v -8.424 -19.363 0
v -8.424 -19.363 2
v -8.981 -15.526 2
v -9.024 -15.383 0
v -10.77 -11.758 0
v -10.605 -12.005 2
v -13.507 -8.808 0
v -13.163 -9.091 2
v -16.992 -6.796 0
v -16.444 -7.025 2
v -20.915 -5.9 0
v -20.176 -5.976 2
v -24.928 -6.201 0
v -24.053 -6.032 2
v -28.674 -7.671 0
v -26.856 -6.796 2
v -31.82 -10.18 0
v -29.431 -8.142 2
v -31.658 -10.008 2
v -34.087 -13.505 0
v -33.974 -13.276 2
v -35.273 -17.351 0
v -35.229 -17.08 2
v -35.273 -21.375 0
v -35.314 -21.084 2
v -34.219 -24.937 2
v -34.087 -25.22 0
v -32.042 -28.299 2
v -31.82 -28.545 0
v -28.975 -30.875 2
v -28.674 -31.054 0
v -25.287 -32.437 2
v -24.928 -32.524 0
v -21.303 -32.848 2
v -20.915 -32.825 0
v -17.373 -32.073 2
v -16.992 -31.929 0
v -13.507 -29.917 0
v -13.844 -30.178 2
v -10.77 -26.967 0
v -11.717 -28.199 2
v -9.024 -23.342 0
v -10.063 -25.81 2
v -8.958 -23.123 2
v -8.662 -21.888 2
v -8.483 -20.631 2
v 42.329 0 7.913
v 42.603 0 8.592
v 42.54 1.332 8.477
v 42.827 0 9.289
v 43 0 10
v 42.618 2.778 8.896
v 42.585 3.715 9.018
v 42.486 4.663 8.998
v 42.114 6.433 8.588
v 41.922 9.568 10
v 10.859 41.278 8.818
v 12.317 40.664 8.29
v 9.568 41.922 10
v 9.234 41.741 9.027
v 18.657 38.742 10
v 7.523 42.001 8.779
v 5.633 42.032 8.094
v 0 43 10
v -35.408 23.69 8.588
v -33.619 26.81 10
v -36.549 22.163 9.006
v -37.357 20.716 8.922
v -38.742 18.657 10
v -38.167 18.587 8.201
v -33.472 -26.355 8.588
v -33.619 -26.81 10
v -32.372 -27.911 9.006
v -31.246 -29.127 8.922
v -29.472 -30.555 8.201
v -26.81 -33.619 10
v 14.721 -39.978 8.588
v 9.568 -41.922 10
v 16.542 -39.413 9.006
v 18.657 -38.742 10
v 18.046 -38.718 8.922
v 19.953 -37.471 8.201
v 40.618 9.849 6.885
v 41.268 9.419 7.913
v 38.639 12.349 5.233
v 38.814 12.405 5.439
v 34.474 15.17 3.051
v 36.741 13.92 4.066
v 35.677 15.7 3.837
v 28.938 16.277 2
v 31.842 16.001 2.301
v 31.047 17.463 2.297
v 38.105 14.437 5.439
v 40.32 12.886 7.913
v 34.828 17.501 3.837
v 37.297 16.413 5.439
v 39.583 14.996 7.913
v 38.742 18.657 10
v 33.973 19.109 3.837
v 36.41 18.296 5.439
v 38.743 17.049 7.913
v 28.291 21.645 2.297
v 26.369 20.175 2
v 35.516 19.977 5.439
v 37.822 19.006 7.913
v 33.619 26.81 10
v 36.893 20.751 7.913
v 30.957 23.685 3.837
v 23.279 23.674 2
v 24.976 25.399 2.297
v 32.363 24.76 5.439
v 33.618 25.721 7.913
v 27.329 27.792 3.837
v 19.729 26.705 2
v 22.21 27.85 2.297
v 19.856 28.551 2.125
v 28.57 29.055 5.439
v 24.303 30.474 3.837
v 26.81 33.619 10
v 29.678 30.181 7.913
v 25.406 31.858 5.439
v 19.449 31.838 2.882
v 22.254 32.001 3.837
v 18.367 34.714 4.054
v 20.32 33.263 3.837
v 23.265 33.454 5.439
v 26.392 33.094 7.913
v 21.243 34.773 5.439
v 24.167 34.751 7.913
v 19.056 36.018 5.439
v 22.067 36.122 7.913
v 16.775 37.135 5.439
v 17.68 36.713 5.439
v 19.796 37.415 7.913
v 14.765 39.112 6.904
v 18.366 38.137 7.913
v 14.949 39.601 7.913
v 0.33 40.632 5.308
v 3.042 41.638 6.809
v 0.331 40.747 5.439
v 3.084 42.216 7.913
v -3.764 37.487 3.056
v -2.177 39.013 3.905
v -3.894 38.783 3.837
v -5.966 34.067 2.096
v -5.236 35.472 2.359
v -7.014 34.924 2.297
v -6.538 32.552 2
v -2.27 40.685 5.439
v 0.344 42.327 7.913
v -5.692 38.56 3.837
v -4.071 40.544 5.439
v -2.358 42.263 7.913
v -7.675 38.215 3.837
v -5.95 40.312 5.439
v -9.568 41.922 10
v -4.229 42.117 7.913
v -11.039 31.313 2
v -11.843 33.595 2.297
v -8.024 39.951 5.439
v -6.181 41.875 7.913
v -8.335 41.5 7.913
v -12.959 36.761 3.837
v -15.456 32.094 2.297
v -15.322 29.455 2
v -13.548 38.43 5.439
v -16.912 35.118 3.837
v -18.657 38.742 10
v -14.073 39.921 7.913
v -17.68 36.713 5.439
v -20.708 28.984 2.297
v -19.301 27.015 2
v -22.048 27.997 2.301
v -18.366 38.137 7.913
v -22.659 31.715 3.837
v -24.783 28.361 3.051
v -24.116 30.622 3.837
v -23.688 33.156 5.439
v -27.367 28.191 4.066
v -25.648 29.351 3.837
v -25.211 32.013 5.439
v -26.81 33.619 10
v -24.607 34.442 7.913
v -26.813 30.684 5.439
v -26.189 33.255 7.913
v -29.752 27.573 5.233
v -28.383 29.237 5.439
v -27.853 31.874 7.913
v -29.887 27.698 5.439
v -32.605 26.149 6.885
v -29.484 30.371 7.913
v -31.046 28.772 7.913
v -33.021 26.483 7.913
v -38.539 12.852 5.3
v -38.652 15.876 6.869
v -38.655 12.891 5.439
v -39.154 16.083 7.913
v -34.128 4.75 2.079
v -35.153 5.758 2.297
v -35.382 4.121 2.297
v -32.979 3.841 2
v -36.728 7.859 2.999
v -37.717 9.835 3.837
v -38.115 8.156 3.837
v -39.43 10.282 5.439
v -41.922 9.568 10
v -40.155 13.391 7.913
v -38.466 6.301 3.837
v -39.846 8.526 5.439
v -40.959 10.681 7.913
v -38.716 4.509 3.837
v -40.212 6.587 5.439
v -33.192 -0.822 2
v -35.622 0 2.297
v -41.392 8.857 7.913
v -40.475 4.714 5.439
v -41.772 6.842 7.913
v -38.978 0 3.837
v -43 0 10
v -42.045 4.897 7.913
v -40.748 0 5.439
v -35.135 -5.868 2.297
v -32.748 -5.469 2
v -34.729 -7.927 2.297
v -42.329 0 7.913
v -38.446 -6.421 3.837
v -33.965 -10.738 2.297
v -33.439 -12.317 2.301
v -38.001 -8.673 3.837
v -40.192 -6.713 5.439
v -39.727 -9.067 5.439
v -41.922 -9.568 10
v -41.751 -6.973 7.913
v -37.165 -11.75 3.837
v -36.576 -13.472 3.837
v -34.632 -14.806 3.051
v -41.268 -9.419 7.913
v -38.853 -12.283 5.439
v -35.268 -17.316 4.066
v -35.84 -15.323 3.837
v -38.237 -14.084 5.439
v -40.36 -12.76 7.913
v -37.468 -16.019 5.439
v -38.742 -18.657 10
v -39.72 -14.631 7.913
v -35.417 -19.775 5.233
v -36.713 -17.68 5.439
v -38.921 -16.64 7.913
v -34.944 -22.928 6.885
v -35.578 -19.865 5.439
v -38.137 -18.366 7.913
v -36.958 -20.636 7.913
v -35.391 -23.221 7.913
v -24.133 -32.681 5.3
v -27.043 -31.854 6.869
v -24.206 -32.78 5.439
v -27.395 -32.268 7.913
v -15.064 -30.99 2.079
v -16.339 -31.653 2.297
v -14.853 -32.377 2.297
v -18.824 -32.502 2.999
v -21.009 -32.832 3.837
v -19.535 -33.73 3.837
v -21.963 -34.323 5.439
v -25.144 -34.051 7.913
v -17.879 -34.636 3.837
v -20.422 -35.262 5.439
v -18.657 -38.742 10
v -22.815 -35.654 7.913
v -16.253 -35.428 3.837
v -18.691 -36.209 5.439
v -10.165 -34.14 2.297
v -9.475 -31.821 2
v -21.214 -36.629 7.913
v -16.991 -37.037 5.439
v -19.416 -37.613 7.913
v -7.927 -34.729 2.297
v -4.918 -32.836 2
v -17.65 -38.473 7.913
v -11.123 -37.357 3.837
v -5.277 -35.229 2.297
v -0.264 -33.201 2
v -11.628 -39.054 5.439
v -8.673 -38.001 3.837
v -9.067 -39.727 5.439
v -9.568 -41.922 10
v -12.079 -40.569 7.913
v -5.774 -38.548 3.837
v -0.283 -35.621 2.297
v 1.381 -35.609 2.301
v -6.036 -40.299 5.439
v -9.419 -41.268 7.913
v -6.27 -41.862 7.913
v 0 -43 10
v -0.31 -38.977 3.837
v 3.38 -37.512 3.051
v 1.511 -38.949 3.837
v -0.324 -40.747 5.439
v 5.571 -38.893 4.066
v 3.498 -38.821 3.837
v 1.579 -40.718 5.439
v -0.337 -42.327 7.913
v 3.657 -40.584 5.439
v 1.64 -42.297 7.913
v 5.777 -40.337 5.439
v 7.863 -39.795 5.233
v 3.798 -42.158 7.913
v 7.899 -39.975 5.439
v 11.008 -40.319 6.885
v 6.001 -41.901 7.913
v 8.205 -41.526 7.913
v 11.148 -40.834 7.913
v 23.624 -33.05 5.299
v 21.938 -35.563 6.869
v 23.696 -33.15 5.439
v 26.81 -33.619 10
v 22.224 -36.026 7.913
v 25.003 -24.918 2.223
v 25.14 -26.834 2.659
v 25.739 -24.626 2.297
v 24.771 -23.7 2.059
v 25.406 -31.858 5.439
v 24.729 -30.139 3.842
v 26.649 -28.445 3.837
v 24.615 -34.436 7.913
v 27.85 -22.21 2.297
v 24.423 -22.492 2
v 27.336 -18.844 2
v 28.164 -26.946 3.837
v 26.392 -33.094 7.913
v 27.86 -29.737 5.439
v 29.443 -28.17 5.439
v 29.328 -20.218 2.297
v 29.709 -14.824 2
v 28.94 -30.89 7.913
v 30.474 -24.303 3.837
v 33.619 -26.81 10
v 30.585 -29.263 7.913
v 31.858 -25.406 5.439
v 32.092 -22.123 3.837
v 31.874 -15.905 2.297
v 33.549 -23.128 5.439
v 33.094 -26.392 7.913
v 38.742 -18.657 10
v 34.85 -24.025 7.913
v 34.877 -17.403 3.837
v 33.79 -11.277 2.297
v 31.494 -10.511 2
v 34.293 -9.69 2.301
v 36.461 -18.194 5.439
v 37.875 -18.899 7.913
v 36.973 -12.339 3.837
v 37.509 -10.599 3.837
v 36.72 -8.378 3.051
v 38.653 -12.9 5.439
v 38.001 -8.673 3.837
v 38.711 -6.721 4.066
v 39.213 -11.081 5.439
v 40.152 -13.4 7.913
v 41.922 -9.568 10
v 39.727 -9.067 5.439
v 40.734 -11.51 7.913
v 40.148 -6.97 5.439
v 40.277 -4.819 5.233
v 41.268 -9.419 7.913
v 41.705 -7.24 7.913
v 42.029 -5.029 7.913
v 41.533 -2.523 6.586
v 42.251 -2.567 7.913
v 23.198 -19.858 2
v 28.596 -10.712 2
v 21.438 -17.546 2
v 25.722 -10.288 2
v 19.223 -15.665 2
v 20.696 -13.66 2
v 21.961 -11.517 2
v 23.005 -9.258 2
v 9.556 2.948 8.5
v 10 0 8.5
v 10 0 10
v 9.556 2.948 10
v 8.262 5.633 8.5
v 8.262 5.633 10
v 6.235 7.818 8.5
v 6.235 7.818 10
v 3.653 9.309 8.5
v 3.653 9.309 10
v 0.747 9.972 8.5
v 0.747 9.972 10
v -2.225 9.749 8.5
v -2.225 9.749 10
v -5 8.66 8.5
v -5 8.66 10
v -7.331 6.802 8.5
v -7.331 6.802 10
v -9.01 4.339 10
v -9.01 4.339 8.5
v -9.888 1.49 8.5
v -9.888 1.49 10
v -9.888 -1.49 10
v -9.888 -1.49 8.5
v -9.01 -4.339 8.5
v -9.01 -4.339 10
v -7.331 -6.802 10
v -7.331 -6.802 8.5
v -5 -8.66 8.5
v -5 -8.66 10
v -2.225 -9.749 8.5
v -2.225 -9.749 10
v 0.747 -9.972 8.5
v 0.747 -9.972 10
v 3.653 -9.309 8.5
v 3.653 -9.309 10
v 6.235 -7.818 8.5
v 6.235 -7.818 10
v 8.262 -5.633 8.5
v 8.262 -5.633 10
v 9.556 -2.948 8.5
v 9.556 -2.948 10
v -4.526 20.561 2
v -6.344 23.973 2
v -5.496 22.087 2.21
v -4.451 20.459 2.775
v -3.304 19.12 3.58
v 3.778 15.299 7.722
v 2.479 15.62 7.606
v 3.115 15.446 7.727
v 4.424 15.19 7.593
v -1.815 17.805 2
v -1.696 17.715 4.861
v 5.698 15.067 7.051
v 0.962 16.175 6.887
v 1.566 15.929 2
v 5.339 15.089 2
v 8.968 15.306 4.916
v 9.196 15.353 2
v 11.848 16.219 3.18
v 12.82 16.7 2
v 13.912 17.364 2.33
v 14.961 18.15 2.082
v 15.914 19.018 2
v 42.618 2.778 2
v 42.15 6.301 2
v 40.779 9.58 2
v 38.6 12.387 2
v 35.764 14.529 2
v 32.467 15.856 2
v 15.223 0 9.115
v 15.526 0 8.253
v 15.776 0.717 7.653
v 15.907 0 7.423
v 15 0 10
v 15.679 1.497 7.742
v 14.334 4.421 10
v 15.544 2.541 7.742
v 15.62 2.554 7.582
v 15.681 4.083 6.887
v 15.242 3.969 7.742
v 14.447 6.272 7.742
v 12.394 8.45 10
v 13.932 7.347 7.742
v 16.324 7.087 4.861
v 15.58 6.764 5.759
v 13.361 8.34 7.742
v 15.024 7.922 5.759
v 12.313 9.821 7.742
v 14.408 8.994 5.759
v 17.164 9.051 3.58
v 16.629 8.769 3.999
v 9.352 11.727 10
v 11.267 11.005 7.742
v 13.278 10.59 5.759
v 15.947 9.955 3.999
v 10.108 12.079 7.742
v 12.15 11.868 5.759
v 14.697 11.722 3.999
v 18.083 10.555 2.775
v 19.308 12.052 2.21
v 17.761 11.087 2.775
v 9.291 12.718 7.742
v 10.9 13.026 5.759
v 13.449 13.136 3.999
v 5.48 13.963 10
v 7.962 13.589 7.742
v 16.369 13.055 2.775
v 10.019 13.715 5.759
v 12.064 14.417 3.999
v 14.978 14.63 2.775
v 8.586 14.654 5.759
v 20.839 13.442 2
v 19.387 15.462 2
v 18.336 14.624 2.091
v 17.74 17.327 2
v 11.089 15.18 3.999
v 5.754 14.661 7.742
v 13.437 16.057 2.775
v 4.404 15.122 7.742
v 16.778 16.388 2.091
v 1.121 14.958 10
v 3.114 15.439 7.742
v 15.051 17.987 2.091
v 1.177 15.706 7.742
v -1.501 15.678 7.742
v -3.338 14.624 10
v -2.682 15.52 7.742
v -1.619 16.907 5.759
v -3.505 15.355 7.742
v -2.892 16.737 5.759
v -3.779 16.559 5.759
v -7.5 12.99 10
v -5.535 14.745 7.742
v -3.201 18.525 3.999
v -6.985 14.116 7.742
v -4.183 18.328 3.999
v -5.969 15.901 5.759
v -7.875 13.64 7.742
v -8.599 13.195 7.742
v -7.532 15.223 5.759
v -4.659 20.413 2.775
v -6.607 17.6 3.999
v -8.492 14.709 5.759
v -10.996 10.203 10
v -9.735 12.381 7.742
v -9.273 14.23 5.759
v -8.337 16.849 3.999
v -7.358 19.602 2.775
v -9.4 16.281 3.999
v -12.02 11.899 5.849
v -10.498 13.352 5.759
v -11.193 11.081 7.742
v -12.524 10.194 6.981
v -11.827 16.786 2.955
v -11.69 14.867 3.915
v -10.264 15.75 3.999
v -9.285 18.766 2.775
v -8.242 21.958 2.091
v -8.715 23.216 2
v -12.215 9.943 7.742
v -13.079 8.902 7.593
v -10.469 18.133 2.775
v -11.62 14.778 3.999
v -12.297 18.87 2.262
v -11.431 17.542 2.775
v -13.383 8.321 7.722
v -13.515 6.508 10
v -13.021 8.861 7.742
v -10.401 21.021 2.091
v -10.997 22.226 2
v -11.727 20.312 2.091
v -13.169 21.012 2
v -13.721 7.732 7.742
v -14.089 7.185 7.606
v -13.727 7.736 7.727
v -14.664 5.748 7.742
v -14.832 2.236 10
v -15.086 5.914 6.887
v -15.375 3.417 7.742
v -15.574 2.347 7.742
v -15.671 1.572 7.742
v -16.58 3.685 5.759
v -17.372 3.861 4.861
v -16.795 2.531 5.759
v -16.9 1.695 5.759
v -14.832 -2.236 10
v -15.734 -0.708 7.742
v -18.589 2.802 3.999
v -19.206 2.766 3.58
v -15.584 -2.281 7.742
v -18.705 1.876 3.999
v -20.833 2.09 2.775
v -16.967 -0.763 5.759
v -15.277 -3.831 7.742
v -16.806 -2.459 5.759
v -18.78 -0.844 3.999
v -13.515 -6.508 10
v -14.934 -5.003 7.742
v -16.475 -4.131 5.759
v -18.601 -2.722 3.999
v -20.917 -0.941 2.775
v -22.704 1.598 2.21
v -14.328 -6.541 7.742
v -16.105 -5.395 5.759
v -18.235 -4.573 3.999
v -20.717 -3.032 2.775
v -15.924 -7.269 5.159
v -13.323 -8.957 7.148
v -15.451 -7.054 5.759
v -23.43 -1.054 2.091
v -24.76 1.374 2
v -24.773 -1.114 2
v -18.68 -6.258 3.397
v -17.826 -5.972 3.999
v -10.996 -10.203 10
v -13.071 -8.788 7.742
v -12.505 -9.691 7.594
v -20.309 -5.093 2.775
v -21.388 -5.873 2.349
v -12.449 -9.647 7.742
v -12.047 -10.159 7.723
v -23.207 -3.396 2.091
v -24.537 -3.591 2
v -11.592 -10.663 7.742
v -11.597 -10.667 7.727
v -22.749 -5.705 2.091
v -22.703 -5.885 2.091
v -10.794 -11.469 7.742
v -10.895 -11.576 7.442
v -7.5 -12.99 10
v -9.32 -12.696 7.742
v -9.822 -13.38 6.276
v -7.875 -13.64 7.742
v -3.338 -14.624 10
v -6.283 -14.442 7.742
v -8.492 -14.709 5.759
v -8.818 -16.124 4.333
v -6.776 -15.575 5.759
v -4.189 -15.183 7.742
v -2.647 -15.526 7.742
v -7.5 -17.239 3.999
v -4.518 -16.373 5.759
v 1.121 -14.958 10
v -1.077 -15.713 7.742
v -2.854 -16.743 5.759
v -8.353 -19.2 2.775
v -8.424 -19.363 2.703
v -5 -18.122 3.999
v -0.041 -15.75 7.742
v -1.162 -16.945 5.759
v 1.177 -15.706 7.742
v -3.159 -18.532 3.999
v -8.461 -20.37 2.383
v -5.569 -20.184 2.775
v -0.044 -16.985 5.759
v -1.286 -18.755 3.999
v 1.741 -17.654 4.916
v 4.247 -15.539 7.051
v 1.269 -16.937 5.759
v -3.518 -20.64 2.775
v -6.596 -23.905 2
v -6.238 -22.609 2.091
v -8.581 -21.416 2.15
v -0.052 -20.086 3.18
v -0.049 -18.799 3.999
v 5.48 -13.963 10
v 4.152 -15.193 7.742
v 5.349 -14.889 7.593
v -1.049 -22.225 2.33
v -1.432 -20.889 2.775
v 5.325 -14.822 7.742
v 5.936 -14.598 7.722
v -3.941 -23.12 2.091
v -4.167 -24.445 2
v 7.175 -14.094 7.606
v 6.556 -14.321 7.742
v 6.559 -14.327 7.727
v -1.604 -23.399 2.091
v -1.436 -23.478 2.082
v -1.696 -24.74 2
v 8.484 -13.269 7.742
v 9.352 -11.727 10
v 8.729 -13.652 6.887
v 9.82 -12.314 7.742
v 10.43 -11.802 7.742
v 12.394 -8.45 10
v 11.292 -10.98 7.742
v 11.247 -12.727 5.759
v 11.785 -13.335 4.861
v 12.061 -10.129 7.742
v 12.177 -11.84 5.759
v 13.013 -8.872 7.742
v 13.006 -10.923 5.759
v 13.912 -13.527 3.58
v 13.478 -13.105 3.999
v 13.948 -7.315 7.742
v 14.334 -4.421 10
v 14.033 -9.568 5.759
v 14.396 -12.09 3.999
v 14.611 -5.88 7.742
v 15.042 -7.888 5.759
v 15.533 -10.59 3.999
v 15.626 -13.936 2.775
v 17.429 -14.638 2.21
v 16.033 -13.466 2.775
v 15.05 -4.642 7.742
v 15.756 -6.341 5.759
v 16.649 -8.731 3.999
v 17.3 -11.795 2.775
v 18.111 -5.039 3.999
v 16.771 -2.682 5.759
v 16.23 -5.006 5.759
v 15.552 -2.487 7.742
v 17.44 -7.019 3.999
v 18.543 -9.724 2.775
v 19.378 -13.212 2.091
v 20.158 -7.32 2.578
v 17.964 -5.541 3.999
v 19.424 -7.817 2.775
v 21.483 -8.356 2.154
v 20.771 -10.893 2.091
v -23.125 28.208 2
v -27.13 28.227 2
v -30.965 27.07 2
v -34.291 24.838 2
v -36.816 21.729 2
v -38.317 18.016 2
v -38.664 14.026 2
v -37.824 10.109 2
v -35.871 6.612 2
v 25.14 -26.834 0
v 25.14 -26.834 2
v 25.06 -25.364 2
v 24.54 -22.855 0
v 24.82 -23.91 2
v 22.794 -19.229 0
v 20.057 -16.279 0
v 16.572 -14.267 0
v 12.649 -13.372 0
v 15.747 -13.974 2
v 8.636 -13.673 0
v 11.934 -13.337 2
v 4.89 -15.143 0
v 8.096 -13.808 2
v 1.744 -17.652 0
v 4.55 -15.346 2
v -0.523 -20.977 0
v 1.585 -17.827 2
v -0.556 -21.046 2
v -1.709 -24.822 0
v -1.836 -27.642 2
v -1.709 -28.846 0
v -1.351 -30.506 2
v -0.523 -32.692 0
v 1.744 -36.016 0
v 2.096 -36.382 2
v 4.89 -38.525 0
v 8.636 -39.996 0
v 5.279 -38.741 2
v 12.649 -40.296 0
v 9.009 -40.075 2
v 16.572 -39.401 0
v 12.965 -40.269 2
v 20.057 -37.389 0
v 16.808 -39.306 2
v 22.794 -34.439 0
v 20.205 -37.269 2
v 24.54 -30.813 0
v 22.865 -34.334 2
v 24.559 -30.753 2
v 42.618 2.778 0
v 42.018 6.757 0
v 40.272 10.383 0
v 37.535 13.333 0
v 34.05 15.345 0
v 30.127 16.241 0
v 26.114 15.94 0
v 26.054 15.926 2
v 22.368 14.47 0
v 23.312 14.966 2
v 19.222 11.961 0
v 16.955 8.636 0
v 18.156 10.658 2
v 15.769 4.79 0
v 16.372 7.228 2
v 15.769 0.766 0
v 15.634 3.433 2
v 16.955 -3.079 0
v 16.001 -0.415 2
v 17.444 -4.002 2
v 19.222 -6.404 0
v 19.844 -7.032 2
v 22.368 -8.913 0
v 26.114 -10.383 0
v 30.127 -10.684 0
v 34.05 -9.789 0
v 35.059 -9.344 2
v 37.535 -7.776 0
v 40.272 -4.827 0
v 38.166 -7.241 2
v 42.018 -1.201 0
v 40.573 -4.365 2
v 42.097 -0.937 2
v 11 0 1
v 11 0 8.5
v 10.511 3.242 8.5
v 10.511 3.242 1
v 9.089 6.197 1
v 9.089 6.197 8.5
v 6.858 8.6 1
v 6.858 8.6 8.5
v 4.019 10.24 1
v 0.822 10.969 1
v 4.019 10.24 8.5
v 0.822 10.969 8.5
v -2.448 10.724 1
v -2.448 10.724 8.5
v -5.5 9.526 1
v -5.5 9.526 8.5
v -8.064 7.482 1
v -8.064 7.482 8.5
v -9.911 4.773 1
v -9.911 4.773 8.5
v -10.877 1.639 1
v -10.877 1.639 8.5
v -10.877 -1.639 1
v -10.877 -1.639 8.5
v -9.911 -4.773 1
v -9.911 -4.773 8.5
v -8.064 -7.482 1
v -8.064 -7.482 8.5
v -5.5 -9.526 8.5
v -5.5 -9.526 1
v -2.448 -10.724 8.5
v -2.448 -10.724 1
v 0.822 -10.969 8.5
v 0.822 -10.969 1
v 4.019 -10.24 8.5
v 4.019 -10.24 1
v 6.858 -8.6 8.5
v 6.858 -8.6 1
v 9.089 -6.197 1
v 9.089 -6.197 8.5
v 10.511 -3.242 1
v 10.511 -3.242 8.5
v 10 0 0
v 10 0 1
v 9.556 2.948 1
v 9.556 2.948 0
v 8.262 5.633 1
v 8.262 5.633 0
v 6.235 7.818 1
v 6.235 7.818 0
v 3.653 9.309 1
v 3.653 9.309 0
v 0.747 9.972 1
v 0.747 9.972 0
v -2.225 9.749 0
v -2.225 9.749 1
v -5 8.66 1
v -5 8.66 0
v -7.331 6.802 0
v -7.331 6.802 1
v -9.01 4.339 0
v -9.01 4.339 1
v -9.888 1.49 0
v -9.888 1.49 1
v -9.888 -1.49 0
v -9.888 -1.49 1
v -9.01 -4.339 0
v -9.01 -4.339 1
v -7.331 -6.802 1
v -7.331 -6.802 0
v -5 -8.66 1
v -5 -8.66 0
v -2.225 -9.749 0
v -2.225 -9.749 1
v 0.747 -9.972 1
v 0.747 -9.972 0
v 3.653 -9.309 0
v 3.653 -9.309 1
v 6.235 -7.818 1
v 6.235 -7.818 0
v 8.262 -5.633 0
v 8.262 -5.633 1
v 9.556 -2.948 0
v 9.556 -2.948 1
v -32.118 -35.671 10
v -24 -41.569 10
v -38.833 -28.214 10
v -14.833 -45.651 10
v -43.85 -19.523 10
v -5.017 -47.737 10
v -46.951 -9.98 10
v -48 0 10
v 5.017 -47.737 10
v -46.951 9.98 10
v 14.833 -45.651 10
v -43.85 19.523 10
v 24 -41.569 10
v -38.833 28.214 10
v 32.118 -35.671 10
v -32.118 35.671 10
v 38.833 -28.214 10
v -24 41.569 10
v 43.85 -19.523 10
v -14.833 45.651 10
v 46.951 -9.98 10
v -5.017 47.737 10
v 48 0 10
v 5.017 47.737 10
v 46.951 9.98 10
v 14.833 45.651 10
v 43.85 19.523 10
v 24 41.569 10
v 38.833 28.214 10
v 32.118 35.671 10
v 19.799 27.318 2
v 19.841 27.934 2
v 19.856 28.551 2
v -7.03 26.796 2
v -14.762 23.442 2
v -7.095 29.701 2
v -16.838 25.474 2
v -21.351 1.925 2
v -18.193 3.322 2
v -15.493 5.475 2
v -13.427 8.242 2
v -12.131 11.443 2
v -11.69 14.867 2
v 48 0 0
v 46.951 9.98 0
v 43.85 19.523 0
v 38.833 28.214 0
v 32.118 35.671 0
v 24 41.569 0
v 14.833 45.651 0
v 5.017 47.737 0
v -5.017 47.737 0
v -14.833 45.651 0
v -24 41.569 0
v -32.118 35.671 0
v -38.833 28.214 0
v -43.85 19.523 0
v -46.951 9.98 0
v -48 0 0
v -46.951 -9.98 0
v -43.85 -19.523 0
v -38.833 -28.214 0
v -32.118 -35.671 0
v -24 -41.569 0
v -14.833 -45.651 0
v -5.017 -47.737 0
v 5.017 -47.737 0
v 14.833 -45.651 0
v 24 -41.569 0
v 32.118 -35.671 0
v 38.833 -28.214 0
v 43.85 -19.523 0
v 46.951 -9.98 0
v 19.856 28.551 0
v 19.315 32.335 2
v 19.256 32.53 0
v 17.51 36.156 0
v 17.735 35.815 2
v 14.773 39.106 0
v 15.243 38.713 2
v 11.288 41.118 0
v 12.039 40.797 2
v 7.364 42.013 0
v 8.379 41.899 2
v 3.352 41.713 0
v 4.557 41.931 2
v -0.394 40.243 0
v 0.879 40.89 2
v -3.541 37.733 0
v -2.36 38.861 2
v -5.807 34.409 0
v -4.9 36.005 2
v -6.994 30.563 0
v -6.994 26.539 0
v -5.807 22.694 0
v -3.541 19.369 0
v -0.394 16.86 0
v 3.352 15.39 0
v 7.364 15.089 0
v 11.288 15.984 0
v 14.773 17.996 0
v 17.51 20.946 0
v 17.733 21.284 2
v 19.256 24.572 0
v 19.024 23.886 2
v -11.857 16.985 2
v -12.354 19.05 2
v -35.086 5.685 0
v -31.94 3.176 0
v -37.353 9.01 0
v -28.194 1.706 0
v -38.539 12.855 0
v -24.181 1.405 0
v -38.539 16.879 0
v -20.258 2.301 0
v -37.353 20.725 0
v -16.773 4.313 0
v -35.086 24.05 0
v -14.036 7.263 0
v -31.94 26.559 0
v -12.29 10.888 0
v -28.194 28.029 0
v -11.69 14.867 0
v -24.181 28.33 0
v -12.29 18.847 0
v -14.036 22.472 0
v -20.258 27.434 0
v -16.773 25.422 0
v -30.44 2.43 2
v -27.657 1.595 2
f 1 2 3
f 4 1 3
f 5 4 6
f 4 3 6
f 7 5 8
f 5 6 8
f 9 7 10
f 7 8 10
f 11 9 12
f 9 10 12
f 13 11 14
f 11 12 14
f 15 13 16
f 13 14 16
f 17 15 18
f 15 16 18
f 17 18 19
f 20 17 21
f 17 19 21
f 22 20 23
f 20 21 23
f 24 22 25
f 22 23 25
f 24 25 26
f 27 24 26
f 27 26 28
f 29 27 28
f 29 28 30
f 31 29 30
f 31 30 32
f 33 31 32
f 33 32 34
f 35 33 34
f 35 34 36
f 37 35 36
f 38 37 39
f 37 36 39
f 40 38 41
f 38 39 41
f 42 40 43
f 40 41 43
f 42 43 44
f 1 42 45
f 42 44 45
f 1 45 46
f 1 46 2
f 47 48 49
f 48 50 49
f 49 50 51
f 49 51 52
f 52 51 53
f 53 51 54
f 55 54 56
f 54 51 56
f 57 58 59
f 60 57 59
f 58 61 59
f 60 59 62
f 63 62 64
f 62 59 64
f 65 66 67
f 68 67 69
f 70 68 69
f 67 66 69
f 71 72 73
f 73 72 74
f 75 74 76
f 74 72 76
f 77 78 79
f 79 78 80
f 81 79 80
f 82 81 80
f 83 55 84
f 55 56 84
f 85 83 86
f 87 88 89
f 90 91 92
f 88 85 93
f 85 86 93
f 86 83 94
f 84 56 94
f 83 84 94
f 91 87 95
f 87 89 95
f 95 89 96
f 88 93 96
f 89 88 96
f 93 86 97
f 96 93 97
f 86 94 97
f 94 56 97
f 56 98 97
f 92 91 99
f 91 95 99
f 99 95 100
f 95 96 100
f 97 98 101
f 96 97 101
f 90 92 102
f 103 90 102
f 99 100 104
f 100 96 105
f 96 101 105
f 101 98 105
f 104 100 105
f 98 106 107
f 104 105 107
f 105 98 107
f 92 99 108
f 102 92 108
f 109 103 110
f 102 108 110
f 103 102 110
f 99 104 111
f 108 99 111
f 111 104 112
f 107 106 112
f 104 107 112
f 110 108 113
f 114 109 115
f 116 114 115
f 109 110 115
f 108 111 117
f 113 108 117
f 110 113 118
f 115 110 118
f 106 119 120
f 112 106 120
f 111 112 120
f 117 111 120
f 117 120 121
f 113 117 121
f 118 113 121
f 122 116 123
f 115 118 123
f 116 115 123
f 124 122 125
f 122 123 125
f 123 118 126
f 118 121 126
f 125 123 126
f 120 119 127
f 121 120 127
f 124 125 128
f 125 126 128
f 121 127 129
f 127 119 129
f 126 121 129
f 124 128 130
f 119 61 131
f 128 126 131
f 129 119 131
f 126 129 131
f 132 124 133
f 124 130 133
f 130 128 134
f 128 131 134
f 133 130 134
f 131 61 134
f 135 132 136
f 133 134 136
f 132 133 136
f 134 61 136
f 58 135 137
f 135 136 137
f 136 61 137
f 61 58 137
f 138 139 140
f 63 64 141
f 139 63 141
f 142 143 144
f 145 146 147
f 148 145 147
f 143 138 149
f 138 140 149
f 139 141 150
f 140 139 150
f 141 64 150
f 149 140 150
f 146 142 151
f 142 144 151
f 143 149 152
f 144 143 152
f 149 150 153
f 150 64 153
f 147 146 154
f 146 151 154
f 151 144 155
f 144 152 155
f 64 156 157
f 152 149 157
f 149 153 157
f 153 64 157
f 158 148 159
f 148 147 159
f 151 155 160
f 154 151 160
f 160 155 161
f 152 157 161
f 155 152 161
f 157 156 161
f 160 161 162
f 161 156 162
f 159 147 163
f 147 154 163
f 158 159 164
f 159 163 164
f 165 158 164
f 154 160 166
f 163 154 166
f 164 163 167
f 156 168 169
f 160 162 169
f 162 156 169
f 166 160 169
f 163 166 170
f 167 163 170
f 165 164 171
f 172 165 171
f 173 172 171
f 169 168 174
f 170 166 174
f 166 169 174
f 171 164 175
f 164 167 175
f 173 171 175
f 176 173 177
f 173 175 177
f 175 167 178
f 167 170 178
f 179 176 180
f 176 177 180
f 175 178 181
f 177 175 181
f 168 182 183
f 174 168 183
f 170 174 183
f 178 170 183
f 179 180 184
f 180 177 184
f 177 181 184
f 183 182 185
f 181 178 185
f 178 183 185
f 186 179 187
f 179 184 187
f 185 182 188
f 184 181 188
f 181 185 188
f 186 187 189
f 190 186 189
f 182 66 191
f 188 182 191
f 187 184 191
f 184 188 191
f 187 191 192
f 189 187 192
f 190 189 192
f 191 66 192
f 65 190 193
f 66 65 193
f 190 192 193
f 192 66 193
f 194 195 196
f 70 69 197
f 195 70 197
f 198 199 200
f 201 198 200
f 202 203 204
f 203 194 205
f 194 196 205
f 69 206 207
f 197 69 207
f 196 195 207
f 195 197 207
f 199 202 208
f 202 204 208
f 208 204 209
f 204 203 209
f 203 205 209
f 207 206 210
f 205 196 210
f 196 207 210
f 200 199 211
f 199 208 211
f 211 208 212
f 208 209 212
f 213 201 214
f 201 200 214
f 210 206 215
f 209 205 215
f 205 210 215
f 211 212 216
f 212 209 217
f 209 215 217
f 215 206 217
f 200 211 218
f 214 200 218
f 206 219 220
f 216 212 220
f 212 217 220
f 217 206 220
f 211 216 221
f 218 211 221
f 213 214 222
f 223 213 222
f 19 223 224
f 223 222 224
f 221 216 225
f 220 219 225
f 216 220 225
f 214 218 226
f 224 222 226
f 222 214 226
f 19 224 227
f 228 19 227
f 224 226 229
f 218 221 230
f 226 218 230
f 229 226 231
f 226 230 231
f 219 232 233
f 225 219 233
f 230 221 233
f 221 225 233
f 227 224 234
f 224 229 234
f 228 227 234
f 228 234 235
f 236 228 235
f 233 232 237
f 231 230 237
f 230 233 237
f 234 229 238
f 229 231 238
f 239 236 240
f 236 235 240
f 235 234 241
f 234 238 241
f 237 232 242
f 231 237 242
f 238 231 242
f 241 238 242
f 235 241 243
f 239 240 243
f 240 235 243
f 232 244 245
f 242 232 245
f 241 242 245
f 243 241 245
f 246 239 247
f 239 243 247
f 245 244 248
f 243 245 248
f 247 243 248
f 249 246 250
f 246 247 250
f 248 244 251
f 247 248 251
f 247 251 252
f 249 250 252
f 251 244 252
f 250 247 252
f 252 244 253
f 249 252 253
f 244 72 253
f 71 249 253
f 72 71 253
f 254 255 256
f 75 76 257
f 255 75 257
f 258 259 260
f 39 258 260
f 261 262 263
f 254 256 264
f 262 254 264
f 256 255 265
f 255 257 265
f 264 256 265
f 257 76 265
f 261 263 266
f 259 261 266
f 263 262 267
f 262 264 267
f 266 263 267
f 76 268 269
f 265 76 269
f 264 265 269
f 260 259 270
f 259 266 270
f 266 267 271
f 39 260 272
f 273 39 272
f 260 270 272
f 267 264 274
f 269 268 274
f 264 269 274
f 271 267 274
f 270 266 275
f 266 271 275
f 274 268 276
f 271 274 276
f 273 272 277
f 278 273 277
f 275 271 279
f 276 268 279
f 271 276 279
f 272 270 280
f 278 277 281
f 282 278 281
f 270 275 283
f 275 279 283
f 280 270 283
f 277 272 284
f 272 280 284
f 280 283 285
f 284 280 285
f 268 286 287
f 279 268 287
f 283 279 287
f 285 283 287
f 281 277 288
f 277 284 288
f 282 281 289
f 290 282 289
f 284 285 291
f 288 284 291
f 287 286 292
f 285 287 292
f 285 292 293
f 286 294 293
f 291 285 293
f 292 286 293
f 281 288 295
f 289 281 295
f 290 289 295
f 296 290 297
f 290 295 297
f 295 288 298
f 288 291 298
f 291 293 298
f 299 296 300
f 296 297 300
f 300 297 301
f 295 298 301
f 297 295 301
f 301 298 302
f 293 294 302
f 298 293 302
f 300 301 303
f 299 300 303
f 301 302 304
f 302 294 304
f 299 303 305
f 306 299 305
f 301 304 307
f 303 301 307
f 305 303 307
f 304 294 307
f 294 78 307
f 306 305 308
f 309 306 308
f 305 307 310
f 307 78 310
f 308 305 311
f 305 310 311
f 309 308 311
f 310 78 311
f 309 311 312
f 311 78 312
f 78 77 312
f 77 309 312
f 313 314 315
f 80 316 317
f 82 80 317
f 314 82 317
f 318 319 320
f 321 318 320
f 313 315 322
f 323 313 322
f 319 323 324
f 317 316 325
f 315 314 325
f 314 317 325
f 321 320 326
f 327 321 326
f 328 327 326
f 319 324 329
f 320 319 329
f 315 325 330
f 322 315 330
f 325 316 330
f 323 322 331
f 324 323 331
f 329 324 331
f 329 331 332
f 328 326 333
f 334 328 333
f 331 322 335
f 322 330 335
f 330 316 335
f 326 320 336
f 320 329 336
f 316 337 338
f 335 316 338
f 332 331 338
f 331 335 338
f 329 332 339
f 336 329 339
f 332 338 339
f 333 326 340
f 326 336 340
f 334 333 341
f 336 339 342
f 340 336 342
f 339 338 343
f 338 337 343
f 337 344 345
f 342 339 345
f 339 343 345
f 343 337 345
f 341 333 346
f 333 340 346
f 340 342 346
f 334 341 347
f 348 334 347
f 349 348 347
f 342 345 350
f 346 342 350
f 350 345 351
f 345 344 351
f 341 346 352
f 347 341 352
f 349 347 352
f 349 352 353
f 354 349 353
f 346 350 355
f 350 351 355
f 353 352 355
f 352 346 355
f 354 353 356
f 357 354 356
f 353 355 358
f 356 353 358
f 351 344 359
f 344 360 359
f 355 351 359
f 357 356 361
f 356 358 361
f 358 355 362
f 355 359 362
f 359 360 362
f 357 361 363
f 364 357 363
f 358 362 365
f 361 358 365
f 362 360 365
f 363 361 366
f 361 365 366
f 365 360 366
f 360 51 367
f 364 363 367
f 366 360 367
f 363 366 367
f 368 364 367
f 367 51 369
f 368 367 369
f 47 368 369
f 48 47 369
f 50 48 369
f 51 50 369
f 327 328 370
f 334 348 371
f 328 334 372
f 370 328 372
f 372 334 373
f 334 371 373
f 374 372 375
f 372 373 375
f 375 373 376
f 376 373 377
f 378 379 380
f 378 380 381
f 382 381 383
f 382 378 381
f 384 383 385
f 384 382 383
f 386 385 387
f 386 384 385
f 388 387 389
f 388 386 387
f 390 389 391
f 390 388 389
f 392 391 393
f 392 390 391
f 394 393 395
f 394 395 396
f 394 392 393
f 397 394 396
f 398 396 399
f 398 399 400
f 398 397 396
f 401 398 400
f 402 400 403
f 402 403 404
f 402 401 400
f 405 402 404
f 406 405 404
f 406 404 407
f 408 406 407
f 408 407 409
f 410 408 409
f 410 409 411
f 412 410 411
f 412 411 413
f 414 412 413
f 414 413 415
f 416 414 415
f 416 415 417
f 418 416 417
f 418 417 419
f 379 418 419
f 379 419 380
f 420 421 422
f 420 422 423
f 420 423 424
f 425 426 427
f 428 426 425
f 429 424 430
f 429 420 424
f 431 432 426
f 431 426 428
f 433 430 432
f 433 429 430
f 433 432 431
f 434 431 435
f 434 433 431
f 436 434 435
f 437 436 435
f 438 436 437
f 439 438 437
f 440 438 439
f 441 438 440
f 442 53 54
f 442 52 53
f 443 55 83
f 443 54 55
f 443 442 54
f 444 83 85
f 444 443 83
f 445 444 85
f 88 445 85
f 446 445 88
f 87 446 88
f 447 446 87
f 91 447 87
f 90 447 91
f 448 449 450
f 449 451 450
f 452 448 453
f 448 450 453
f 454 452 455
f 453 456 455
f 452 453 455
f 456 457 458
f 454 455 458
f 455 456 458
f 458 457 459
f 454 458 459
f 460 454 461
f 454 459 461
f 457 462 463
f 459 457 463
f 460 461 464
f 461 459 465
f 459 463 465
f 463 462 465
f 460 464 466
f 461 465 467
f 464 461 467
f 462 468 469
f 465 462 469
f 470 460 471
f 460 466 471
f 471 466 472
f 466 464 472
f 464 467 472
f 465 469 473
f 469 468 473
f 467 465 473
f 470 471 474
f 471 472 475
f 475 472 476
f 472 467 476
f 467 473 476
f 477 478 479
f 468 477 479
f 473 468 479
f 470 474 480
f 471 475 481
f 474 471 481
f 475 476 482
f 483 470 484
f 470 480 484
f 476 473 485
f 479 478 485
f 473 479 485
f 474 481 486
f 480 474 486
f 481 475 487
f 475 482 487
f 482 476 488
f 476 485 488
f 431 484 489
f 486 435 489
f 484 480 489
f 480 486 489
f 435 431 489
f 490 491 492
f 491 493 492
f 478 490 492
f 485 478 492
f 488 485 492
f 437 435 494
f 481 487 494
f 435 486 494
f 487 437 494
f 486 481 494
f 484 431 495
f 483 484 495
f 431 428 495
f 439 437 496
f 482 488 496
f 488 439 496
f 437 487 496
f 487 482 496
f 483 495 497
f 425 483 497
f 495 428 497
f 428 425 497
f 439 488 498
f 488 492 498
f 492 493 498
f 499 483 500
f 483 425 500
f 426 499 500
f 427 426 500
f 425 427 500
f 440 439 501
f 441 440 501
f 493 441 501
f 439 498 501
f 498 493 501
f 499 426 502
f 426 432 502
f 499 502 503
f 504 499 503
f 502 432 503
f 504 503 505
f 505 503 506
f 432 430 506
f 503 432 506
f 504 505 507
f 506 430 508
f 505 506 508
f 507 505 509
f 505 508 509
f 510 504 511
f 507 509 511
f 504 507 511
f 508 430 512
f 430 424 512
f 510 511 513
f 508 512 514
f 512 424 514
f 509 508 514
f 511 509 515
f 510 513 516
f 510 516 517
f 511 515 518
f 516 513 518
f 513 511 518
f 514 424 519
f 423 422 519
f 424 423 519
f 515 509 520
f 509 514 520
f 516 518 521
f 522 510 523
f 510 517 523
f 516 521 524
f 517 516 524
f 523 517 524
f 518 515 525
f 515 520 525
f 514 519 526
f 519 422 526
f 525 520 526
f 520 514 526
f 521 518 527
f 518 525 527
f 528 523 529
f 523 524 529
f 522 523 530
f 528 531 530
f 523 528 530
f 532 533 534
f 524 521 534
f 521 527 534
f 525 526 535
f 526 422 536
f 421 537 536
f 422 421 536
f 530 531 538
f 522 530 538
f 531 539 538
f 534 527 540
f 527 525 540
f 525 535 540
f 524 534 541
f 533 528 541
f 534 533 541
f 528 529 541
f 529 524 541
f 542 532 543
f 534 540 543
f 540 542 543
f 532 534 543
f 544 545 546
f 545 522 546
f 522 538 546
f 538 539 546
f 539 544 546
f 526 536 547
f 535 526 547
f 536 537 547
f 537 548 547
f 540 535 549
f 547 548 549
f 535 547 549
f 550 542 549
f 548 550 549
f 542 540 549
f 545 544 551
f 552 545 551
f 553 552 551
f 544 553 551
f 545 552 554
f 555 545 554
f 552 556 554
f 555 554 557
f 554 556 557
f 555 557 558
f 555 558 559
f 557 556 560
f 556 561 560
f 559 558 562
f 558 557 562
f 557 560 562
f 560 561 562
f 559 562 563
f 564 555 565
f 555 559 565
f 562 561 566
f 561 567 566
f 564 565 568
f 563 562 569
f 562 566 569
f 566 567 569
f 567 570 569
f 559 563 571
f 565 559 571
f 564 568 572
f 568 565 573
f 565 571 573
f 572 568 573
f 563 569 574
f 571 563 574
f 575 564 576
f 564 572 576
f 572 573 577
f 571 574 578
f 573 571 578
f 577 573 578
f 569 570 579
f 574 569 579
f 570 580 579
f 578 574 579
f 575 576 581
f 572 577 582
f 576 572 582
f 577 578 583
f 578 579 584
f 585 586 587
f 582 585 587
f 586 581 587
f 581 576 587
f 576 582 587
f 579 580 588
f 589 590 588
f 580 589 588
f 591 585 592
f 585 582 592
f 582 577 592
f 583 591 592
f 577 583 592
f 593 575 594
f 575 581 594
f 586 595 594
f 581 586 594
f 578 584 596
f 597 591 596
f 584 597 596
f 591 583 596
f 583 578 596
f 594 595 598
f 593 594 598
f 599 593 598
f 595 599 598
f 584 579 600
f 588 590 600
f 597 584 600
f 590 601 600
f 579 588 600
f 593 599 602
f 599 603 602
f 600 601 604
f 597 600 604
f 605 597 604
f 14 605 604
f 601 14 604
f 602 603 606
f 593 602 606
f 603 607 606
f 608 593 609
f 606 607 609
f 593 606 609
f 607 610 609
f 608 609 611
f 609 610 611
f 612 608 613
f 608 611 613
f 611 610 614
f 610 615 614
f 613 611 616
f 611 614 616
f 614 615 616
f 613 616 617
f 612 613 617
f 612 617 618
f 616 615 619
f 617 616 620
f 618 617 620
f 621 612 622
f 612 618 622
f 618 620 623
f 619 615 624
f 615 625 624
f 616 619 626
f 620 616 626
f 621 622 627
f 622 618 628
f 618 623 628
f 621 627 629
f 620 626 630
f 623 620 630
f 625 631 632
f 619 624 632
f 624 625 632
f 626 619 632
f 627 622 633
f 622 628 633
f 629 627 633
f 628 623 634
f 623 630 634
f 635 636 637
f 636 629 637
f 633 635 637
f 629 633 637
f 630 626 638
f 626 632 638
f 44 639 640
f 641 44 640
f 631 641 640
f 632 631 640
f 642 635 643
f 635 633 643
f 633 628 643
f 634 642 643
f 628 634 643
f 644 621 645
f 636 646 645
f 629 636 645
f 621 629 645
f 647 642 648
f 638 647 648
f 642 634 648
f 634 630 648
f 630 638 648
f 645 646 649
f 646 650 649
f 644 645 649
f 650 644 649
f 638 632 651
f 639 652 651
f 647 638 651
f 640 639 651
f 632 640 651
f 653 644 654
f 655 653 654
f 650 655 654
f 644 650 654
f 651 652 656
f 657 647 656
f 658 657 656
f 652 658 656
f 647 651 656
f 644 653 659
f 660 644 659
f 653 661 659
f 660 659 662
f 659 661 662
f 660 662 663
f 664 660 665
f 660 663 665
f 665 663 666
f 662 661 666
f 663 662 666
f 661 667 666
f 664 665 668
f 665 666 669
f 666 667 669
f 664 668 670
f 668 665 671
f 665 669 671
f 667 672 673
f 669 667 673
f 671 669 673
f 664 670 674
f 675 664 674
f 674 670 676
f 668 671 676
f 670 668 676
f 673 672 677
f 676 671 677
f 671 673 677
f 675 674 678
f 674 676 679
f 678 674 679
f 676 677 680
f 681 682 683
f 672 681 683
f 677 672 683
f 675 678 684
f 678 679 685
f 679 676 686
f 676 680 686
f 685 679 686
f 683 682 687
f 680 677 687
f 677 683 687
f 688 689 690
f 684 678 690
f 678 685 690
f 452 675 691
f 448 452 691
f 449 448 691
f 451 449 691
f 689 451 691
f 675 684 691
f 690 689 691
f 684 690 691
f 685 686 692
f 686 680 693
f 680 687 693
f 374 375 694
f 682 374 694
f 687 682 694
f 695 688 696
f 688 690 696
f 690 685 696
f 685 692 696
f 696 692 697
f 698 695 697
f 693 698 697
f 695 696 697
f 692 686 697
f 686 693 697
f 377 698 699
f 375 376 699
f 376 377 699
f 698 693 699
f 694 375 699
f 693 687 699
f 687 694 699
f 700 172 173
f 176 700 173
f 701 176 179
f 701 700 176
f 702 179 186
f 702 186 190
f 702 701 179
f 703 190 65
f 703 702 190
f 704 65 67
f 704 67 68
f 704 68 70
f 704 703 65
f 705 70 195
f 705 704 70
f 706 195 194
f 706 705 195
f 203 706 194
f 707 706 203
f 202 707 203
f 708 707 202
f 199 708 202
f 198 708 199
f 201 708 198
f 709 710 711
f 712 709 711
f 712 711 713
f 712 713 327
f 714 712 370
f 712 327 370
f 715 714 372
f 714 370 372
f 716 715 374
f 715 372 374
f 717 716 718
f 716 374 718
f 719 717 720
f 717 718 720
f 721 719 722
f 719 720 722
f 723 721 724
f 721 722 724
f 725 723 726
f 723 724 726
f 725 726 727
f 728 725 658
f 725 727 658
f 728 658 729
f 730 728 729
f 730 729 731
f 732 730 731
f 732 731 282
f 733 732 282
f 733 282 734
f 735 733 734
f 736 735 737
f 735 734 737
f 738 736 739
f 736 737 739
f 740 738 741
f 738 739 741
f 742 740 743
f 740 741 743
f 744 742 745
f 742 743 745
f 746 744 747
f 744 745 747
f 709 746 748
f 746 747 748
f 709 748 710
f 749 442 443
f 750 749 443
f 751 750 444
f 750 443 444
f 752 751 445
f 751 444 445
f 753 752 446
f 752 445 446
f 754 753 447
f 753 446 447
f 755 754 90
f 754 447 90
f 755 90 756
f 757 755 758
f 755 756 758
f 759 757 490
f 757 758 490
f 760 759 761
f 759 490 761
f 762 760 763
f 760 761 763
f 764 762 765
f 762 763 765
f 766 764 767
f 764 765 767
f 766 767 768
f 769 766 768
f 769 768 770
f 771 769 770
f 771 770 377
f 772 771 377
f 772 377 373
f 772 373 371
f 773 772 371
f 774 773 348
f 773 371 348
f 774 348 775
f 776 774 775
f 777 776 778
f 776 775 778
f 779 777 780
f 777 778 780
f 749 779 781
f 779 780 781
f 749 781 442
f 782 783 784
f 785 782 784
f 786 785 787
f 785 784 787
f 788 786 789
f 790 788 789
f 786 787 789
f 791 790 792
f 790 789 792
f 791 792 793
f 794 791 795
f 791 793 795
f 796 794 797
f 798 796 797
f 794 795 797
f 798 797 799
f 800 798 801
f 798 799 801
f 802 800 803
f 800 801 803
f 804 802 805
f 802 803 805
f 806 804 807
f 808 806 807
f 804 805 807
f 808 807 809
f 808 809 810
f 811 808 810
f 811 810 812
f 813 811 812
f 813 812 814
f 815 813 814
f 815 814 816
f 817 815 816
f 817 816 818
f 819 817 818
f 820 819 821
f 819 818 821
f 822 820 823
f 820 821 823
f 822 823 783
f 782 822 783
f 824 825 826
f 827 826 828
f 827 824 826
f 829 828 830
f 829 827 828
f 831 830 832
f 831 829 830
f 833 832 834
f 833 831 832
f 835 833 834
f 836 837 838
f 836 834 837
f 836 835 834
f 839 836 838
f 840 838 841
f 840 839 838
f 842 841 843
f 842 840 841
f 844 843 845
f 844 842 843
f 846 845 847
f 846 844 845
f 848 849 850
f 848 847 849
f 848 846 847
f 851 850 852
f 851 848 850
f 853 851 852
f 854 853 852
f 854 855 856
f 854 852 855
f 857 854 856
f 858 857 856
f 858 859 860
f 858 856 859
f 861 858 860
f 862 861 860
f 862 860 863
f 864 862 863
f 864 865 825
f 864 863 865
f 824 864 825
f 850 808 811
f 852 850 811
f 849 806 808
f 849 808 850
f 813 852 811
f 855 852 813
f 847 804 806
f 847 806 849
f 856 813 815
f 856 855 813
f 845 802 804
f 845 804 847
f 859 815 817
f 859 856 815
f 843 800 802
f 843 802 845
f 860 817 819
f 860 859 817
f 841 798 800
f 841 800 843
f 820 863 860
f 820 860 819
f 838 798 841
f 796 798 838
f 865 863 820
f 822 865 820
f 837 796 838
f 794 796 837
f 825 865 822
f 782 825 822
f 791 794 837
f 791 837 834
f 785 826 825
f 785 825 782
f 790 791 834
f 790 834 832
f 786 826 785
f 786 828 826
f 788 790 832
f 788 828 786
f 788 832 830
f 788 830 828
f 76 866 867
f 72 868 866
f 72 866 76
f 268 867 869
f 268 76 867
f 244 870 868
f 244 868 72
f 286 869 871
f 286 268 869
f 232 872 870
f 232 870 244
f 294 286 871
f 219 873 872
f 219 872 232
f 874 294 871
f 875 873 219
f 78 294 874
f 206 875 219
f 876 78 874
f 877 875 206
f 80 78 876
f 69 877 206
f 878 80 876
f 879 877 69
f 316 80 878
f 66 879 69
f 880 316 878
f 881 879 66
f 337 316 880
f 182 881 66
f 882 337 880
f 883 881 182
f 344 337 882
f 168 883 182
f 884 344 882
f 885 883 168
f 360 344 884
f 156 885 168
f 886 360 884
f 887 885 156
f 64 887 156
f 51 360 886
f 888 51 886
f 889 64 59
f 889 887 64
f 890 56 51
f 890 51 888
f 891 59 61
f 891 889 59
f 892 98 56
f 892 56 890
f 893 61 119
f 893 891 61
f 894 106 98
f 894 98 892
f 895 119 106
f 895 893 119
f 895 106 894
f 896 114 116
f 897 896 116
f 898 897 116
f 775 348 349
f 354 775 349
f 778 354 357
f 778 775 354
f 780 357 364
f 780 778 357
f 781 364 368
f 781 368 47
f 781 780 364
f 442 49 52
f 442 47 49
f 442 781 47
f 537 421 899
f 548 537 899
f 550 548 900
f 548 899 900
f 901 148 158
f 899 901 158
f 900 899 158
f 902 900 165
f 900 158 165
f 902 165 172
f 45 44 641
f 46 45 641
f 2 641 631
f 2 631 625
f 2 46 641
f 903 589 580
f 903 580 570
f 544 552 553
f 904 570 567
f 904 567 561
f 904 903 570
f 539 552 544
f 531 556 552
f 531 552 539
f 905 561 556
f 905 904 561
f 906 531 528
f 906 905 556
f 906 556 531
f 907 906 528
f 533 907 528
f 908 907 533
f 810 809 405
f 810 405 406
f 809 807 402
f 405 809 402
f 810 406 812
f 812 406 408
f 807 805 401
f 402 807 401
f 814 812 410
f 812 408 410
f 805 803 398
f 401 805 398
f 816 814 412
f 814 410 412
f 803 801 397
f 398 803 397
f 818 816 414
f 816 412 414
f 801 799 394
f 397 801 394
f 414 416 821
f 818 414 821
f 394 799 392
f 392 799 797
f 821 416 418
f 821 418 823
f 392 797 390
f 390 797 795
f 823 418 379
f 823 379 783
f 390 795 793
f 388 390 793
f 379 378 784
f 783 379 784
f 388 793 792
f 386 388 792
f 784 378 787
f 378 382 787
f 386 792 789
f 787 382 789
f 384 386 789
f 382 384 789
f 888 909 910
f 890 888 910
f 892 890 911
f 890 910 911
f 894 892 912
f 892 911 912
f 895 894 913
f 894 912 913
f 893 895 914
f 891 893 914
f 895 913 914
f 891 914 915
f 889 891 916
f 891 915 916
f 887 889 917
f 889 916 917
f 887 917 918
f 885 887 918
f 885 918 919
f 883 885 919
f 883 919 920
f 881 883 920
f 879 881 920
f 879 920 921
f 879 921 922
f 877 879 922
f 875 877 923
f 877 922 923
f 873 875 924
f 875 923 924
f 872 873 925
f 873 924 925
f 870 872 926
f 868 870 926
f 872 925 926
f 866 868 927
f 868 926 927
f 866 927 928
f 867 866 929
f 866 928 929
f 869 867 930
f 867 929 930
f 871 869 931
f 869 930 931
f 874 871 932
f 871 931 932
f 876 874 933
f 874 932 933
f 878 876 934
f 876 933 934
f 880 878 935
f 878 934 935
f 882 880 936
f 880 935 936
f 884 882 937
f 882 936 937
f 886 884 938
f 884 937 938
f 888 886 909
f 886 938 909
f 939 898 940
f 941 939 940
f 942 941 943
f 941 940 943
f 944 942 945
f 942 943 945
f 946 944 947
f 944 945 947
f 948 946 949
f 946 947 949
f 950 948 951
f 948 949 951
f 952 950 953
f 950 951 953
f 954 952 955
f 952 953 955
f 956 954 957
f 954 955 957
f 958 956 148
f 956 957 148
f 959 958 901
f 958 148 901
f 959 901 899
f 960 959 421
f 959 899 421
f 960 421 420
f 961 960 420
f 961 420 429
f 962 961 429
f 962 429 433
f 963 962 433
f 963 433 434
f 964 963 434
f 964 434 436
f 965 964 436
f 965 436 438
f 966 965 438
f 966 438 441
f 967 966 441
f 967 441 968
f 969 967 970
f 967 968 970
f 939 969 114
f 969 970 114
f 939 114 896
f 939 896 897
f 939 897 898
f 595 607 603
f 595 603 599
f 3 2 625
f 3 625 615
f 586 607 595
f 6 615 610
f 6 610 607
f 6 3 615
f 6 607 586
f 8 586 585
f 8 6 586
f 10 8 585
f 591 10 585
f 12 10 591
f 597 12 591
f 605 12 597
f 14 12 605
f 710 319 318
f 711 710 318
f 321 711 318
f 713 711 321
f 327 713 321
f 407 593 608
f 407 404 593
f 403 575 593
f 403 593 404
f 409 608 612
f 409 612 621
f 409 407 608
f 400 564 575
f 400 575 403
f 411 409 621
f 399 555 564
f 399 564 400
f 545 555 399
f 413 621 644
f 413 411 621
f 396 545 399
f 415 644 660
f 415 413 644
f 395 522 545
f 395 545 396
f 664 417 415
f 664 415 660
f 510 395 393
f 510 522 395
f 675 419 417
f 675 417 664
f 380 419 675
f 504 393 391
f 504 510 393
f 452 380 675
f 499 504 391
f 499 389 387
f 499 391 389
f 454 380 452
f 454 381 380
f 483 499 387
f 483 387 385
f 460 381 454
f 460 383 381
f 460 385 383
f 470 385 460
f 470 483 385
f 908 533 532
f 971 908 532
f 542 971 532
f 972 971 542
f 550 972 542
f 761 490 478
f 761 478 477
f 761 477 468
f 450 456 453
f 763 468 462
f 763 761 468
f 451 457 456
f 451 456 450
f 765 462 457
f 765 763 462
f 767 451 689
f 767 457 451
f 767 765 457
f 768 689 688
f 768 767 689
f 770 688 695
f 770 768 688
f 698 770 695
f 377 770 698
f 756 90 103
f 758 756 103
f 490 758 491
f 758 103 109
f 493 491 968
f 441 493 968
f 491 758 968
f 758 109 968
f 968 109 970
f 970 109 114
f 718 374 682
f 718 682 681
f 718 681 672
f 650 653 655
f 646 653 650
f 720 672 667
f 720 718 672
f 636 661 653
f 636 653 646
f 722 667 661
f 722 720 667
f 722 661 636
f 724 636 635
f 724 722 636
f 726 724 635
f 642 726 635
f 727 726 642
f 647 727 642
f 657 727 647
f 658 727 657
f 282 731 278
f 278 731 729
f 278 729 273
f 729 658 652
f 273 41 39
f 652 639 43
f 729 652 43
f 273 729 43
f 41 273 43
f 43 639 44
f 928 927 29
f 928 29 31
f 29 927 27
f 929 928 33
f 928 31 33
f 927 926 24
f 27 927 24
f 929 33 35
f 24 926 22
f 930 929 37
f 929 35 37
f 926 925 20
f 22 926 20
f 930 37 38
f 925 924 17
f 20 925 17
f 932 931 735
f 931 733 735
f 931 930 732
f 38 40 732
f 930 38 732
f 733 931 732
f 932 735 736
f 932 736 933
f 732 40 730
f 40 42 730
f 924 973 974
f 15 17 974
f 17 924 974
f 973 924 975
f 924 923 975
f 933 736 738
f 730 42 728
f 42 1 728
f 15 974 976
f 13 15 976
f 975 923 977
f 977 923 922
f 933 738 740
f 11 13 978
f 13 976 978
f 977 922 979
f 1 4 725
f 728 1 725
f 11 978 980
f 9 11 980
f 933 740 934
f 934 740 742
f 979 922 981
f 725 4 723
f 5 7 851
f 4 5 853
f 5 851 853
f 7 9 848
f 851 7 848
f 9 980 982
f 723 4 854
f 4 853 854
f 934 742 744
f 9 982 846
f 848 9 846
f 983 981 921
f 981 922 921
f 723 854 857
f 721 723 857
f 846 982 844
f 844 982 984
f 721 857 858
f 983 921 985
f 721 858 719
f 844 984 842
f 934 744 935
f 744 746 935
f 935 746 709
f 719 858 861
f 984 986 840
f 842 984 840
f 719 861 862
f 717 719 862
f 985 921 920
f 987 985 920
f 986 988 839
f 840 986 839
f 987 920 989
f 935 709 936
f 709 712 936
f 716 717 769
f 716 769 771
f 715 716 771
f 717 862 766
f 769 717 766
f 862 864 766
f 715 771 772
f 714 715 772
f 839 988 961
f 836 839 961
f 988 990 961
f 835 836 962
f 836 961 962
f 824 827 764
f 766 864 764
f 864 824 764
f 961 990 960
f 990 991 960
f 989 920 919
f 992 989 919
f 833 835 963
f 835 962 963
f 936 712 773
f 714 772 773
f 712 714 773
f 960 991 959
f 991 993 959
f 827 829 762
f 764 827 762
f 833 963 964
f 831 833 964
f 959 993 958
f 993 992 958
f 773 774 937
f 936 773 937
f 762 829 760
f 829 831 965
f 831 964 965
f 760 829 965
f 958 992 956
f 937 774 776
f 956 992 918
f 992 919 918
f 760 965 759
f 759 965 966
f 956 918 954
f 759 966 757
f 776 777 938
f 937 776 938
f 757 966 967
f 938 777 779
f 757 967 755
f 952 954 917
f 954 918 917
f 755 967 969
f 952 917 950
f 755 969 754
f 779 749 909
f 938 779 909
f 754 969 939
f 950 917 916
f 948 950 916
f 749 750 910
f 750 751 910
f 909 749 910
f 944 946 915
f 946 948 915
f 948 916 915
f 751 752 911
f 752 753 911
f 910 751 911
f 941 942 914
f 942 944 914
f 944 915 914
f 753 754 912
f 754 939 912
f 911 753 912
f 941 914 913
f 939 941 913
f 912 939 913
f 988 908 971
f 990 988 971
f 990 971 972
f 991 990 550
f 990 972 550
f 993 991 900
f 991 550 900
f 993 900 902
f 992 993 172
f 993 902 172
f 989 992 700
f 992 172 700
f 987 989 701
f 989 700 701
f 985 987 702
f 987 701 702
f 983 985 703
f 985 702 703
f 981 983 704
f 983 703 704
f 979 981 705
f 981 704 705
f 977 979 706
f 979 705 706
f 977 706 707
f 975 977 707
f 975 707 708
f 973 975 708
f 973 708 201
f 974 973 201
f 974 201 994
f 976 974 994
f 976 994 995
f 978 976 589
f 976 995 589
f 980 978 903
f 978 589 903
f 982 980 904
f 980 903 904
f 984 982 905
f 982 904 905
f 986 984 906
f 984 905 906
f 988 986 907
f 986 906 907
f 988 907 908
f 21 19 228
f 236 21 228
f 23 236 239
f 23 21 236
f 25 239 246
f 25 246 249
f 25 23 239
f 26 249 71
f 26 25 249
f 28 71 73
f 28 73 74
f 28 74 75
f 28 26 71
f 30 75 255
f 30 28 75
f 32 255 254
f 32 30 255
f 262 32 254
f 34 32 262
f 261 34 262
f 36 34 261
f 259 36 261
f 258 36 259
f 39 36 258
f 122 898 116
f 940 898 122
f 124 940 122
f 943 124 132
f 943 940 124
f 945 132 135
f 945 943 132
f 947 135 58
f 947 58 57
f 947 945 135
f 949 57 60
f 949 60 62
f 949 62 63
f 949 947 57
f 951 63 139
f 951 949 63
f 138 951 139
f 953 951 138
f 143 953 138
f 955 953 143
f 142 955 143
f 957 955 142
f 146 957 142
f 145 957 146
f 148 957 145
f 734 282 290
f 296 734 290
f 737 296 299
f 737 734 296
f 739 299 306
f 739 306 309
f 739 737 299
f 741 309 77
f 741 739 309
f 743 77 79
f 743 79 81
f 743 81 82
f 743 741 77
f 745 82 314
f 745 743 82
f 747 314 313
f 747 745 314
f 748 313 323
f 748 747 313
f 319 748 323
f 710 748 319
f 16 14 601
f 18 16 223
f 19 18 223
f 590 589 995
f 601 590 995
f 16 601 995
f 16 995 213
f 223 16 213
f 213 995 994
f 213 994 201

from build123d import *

# Parameters (mm, degrees)
SKETCH1_R           = 48
SKETCH1_R_2         = 10
BOSS_EXTRUDE1_DEPTH = 10
CUT_EXTRUDE1_START  = -1.5
SKETCH2_R           = 11
CUT_EXTRUDE1_DEPTH  = 7.5
SKETCH3_R           = 43
SKETCH3_R_2         = 15
CUT_EXTRUDE2_DEPTH  = 8
SKETCH4_R           = 13.5
CUT_EXTRUDE3_DEPTH  = 8
FILLET1_START       = 2
FILLET1_OUTLINE_R   = 43
FILLET1_OUTLINE_R_2 = 13.5
FILLET1_OUTLINE_R_3 = 15
FILLET1_DEPTH       = 8.0000001


with BuildPart() as part:
    # Sketch1 → Boss-Extrude1 (new body)
    with BuildSketch(Plane.XY):
        Circle(SKETCH1_R)
        Circle(SKETCH1_R_2, mode=Mode.SUBTRACT)
    extrude(amount=BOSS_EXTRUDE1_DEPTH)

    # Sketch2 → Cut-Extrude1 (cut)
    with BuildSketch(Plane.XY.offset(10).offset(CUT_EXTRUDE1_START)):
        Circle(SKETCH2_R)
    extrude(amount=-CUT_EXTRUDE1_DEPTH, mode=Mode.SUBTRACT)

    # Sketch3 → Cut-Extrude2 (cut)
    with BuildSketch(Plane.XY.offset(10)):
        Circle(SKETCH3_R)
        Circle(SKETCH3_R_2, mode=Mode.SUBTRACT)
    extrude(amount=-CUT_EXTRUDE2_DEPTH, mode=Mode.SUBTRACT)

    # Sketch4 → Cut-Extrude3 (cut)
    with BuildSketch(Plane.XY.offset(2)):
        with Locations((-21.923747427, -19.362639251)):
            Circle(SKETCH4_R)
        with Locations((-25.189774768, 14.867338267)):
            Circle(SKETCH4_R)
        with Locations((6.355610451, 28.551159623)):
            Circle(SKETCH4_R)
        with Locations((29.117758046, 2.778248798)):
            Circle(SKETCH4_R)
        with Locations((11.640153697, -26.834107436)):
            Circle(SKETCH4_R)
    extrude(amount=-CUT_EXTRUDE3_DEPTH, mode=Mode.SUBTRACT)

    # Fillet1: read off the stored shape, not the designer's step
    # Fillet1 outline → Fillet1 (add)
    with BuildSketch(Plane.XY.offset(FILLET1_START)):
        Circle(FILLET1_OUTLINE_R)
        with Locations((-21.923747427, -19.362639251)):
            Circle(FILLET1_OUTLINE_R_2, mode=Mode.SUBTRACT)
        with Locations((11.640153697, -26.834107436)):
            Circle(FILLET1_OUTLINE_R_2, mode=Mode.SUBTRACT)
        with Locations((-25.189774768, 14.867338267)):
            Circle(FILLET1_OUTLINE_R_2, mode=Mode.SUBTRACT)
        Circle(FILLET1_OUTLINE_R_3, mode=Mode.SUBTRACT)
        with Locations((29.117758046, 2.778248798)):
            Circle(FILLET1_OUTLINE_R_2, mode=Mode.SUBTRACT)
        with Locations((6.355610451, 28.551159623)):
            Circle(FILLET1_OUTLINE_R_2, mode=Mode.SUBTRACT)
    extrude(amount=FILLET1_DEPTH)

    # Fillet1 2 outline → Fillet1 2 (revolve, cut)
    with BuildSketch(Plane.XZ):
        with BuildLine():
            ThreePointArc((15, 10), (18.473403651, 4.254033308), (24.797958971, 2))
            Line((24.797958971, 2), (33.202041029, 2))
            ThreePointArc((33.202041029, 2), (39.526596349, 4.254033308), (43, 10))
            Line((43, 10), (15, 10))
        make_face()
    revolve(axis=Axis((0, 0, 0), (0, 0, 1)), mode=Mode.SUBTRACT)


solid = part.part
